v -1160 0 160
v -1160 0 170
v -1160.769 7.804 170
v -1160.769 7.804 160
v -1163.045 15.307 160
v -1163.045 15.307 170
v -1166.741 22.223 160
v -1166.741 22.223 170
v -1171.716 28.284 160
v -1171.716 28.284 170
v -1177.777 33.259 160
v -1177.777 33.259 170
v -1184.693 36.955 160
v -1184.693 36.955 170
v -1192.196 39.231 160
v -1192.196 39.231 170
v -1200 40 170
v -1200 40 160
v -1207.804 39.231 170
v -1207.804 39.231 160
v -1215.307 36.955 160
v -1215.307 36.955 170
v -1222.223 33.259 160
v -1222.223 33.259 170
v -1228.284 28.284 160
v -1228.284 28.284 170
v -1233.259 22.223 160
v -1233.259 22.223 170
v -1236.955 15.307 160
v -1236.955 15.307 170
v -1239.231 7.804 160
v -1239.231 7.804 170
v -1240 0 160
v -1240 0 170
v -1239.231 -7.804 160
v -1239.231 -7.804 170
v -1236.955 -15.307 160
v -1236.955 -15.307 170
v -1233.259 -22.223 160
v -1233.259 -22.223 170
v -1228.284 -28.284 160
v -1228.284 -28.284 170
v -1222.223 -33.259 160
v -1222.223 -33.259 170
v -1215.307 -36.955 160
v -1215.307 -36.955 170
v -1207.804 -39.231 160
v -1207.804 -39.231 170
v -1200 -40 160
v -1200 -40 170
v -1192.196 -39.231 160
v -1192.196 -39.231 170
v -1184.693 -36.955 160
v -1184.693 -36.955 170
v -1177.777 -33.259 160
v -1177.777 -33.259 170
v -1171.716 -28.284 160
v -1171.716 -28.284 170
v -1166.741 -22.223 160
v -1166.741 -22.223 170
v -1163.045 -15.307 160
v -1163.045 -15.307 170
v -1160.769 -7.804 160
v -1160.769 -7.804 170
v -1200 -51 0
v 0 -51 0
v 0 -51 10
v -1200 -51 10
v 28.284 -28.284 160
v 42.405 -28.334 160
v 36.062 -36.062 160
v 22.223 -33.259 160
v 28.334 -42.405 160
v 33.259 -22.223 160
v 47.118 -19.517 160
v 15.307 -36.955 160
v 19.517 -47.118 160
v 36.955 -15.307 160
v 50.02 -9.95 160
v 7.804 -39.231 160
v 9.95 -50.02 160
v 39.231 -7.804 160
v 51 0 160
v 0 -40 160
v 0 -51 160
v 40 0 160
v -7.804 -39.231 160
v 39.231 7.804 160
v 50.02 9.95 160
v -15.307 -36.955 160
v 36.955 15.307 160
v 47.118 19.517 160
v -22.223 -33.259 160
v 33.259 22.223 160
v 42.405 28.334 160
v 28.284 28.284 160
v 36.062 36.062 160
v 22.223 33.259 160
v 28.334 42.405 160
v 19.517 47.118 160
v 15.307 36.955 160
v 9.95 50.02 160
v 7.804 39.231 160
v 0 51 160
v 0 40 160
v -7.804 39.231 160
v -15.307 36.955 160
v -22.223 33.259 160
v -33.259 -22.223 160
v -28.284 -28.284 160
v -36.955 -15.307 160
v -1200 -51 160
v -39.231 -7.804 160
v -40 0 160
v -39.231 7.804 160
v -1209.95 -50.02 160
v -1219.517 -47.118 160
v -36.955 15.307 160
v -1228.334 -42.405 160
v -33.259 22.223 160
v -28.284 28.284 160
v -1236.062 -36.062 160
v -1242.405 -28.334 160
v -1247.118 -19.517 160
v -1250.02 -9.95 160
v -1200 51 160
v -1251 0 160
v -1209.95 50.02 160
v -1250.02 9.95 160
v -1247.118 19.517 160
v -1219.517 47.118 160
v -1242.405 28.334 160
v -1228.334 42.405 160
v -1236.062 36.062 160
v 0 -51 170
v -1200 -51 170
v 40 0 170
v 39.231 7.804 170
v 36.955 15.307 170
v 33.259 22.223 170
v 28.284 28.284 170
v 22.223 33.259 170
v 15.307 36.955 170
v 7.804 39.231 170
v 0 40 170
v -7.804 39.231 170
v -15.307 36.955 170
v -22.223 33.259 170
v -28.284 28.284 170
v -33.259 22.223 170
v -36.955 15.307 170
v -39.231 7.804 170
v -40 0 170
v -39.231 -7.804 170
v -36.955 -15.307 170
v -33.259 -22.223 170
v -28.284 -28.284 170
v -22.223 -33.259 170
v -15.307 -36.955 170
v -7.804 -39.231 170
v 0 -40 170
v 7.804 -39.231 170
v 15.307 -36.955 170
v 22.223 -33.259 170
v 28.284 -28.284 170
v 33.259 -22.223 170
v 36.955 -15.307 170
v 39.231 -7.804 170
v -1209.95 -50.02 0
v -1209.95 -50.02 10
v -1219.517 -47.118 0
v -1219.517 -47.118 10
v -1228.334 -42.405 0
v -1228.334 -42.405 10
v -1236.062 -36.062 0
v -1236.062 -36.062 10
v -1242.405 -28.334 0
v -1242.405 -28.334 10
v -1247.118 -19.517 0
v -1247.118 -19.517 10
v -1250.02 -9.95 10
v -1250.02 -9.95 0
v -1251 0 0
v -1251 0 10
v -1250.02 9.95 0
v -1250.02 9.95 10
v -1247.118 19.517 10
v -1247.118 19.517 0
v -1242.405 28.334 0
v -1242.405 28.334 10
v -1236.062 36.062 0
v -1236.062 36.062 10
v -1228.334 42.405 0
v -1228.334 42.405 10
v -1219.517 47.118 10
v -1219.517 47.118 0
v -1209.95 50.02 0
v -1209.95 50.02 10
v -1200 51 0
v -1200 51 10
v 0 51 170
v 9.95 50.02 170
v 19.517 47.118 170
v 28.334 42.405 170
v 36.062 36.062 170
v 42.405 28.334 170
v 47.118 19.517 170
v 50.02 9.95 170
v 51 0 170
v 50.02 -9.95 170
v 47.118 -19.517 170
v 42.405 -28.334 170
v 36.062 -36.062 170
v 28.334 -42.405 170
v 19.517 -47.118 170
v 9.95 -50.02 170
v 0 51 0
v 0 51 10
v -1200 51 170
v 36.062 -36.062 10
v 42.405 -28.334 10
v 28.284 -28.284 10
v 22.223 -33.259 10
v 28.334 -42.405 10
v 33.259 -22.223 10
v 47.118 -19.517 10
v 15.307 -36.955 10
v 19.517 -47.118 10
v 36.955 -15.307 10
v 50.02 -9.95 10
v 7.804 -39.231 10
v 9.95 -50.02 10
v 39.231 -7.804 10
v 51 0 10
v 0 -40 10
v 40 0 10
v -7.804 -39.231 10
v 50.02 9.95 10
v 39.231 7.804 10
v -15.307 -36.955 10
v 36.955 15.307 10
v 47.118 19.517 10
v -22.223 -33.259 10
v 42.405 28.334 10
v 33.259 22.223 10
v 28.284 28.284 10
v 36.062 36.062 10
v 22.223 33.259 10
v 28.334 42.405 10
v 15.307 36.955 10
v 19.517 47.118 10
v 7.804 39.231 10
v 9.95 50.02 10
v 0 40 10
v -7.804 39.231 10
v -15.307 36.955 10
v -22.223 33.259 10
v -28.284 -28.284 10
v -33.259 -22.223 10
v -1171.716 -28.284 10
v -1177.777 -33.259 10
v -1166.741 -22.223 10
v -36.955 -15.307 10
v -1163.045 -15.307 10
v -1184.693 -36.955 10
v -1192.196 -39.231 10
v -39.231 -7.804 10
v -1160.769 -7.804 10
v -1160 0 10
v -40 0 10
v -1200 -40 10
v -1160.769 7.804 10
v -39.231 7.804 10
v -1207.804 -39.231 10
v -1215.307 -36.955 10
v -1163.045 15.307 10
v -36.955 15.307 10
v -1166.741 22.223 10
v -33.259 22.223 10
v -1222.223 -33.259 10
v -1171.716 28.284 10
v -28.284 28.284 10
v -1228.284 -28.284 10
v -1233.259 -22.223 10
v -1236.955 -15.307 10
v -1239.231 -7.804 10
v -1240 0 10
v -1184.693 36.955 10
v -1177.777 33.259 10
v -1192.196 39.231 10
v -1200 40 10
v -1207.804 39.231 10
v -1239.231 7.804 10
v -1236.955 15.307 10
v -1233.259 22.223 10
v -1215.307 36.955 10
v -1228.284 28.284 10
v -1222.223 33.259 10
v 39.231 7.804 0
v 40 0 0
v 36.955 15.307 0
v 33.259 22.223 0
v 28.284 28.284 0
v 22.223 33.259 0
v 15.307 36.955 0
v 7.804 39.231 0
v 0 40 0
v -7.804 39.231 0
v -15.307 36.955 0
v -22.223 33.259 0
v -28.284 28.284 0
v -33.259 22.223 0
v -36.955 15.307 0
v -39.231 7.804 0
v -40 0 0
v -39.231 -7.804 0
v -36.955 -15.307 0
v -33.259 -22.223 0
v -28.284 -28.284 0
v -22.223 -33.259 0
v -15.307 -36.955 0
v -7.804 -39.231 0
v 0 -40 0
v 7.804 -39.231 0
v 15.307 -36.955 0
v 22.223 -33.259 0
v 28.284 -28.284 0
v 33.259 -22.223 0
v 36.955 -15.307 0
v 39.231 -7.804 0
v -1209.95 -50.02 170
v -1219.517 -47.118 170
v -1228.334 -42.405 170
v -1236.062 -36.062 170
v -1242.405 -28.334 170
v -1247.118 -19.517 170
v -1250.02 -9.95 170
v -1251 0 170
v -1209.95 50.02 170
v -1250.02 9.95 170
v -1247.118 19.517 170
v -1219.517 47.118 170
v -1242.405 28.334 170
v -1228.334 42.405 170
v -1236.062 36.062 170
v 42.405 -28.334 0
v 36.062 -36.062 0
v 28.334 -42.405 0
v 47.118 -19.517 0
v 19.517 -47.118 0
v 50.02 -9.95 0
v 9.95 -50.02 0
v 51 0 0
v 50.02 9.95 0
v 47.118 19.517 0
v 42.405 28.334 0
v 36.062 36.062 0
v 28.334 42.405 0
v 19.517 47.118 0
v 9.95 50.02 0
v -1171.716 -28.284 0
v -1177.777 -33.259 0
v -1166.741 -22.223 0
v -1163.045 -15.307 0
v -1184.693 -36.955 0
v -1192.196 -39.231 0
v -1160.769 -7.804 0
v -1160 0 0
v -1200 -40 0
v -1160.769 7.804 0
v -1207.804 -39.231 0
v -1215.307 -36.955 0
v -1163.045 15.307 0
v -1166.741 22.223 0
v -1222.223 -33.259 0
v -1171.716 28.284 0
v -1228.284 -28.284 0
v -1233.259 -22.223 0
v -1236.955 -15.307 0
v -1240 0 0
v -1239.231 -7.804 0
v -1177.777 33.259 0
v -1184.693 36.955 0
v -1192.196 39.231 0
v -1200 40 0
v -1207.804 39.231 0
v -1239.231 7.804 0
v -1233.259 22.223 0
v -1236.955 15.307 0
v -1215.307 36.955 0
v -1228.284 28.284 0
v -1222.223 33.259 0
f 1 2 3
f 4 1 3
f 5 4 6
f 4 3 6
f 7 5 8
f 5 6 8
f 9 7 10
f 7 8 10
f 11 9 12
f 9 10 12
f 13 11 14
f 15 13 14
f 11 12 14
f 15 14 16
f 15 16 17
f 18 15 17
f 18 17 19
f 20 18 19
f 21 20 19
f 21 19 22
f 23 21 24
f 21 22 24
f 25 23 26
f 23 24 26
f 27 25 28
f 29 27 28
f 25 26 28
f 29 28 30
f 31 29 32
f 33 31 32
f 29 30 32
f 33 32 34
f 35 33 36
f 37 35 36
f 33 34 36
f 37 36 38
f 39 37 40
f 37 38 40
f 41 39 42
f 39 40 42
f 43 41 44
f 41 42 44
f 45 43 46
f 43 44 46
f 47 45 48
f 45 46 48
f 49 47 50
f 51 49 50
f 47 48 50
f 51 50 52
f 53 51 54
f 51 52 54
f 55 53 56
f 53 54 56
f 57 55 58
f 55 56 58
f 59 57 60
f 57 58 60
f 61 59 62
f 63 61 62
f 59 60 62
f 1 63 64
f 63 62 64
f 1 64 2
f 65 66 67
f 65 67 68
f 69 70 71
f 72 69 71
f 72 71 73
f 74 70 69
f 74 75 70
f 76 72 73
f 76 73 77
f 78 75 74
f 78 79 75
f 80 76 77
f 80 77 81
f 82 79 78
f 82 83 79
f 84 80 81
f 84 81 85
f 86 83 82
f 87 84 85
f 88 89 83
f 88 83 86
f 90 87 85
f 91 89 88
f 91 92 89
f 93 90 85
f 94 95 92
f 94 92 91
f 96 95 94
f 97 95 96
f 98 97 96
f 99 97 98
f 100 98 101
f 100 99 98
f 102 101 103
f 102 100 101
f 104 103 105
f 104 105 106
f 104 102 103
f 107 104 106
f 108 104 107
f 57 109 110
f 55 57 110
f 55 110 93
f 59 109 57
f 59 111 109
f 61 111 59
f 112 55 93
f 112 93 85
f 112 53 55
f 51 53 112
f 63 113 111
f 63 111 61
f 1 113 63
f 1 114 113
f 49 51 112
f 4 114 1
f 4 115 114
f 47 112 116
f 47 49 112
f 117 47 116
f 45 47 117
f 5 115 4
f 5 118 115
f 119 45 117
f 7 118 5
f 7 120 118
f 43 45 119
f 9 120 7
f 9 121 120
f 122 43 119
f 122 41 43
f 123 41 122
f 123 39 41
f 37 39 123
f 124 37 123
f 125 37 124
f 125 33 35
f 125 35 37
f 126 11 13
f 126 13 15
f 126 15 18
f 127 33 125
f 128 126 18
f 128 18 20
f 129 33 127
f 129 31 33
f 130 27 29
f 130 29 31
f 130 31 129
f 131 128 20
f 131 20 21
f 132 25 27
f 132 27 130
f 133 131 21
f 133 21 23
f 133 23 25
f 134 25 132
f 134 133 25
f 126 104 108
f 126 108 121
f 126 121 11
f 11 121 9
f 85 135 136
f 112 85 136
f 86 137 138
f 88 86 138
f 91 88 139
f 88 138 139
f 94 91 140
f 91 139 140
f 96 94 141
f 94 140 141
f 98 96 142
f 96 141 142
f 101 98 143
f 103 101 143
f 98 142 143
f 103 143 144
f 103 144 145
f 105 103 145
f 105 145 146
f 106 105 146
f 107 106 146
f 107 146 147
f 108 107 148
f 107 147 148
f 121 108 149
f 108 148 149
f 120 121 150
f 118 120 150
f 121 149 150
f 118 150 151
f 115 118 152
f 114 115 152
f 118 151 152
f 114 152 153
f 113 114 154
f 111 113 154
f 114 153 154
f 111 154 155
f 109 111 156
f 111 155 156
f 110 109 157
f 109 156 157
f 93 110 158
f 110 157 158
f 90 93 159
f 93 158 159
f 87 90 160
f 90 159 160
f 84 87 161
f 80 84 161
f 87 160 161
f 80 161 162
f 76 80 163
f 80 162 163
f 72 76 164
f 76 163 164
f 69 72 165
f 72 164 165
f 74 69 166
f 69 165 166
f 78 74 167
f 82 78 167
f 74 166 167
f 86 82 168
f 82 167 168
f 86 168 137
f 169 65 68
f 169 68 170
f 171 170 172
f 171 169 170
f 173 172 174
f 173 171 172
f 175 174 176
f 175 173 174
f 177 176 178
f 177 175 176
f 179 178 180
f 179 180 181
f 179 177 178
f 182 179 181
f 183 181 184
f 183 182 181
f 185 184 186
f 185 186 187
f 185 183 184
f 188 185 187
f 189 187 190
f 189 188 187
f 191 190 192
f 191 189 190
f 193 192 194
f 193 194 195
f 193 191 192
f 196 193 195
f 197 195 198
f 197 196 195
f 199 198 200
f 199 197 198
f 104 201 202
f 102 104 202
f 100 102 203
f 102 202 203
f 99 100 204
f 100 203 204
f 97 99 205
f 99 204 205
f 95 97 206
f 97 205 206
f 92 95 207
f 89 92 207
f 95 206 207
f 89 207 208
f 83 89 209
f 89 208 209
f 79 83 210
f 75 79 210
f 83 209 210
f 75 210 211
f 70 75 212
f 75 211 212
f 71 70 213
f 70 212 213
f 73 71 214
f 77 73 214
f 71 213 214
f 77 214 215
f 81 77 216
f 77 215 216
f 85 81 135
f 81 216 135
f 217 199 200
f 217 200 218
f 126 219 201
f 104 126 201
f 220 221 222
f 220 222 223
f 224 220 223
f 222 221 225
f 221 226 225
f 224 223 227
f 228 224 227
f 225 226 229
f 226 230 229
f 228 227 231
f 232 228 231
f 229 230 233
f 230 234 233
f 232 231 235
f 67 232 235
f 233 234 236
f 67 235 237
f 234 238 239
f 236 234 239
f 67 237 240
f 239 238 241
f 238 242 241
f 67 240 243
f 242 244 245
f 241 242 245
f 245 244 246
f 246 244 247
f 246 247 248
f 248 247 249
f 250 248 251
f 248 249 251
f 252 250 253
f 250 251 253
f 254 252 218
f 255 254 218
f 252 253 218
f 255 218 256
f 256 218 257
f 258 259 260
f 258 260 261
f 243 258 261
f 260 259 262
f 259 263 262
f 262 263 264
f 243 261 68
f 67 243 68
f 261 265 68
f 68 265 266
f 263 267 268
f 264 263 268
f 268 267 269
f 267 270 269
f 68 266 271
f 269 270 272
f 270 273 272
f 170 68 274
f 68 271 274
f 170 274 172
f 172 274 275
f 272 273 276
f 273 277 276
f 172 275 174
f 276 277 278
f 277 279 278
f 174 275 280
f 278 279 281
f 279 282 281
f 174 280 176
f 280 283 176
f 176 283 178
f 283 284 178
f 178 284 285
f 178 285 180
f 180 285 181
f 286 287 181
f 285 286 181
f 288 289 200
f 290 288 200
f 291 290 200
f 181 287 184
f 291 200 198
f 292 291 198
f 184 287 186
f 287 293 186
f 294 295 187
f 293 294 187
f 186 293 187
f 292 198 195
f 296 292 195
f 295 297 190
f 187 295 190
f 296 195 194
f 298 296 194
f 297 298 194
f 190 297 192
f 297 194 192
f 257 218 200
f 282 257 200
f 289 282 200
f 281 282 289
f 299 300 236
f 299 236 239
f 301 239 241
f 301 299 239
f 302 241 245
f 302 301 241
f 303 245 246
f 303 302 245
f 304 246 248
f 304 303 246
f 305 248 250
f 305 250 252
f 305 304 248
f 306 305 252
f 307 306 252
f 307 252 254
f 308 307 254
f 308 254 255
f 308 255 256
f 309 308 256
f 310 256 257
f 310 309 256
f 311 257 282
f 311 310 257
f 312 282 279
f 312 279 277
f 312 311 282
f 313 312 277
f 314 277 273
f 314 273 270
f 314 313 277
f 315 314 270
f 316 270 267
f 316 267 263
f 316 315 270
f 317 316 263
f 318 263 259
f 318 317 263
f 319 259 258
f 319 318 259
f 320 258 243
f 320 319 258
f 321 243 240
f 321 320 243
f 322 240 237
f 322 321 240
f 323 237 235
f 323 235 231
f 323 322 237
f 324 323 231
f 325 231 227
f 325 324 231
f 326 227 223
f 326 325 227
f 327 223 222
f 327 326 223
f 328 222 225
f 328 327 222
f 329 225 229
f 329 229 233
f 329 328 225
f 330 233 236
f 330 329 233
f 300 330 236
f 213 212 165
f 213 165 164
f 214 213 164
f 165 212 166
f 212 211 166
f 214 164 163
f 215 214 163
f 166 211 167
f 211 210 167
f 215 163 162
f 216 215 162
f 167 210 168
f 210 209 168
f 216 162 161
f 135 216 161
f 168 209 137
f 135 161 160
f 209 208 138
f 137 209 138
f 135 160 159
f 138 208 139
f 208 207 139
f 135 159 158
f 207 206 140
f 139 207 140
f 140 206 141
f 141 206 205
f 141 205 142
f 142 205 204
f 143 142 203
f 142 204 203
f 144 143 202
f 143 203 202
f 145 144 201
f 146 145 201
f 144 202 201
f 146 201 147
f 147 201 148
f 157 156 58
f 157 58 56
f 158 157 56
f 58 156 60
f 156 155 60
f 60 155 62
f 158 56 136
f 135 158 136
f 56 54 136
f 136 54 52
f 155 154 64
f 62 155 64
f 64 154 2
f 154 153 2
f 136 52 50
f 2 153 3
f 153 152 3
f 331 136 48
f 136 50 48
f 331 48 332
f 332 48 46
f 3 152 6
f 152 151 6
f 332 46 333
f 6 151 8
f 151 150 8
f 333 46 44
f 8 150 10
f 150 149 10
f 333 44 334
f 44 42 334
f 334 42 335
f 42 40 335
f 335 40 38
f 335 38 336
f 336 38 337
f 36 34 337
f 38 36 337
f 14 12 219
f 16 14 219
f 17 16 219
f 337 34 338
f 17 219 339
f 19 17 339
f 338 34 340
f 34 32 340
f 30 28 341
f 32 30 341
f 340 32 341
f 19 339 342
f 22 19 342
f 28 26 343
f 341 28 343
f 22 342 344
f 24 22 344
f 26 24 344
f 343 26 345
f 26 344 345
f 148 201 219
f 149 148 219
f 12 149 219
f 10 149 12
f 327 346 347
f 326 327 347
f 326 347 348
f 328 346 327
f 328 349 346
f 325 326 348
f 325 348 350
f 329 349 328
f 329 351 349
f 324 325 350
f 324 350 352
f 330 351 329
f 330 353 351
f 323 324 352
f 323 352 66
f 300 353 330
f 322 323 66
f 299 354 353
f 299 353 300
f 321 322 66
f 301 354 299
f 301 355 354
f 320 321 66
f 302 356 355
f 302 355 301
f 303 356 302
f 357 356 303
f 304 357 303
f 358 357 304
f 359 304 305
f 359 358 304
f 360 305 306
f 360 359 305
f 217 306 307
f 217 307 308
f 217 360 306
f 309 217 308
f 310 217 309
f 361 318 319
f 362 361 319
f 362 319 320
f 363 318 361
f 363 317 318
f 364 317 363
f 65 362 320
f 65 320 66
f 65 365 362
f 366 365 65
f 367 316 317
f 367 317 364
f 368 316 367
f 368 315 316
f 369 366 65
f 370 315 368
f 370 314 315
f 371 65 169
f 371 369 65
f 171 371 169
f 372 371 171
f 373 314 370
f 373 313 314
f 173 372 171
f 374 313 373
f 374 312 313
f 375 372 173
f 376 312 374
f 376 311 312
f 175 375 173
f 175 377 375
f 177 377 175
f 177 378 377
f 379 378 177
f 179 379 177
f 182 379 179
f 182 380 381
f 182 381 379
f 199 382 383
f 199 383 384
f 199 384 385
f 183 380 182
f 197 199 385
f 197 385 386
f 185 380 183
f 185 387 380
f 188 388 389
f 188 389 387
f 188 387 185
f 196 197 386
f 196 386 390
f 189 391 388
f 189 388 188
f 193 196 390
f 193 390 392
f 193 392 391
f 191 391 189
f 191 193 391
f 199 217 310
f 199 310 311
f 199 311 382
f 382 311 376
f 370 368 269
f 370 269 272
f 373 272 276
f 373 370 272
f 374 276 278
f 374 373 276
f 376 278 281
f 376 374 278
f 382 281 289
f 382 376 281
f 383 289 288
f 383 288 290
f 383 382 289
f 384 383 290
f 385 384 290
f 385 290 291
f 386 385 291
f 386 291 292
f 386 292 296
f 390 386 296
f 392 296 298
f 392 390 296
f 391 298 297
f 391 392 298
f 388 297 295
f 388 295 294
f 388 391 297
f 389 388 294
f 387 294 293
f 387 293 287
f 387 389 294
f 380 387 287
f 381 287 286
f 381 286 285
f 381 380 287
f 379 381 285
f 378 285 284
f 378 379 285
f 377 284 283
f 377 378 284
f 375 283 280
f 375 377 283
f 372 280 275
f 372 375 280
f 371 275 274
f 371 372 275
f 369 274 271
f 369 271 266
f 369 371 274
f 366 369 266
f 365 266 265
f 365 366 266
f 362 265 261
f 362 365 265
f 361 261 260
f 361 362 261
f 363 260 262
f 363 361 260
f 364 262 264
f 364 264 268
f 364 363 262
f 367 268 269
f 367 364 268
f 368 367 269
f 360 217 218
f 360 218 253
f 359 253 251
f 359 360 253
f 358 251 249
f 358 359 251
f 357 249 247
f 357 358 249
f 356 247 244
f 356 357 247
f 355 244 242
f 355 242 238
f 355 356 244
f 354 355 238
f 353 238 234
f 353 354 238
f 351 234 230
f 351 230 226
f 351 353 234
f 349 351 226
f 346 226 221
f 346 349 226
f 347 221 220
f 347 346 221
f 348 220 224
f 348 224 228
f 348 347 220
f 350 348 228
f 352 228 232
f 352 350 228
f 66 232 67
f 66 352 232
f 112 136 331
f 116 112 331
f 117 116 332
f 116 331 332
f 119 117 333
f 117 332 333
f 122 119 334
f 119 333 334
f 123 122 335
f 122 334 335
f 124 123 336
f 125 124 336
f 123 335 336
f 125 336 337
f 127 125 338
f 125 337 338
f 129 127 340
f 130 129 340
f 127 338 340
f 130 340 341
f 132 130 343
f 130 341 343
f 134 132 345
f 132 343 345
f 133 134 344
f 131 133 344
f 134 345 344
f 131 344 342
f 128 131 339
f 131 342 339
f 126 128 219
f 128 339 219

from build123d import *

# Parameters (mm, degrees)
SKETCH1_R           = 40
BOSS_EXTRUDE1_DEPTH = 10


with BuildPart() as part:
    # Sketch1 → Boss-Extrude1 (new body)
    with BuildSketch(Plane.XY):
        with BuildLine():
            Line((0, -51), (-1200, -51))
            ThreePointArc((-1200, -51), (-1251, 0), (-1200, 51))
            Line((-1200, 51), (0, 51))
            ThreePointArc((0, 51), (51, 0), (0, -51))
        make_face()
        Circle(SKETCH1_R, mode=Mode.SUBTRACT)
        with Locations((-1200, 0)):
            Circle(SKETCH1_R, mode=Mode.SUBTRACT)
    extrude(amount=BOSS_EXTRUDE1_DEPTH)


with BuildPart() as body_2:
    # 镜向4: mirrored copy
    add(part.part.mirror(Plane.XY.offset(85)))


solid = Compound([part.part, body_2.part])
